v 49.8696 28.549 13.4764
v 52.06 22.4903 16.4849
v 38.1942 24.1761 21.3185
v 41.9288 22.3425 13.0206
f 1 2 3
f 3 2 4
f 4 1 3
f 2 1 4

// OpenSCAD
// Auto-generated auxetic polyhedron
points = [
    [38.194204, 24.176076, 21.318477],
    [52.059952, 22.490314, 16.484935],
    [49.869558, 28.549023, 13.476408],
    [41.928761, 22.342461, 13.020647],
];

faces = [
    [0, 1, 2],
    [3, 1, 0],
    [0, 2, 3],
    [3, 2, 1],
];

polyhedron(points = points, faces = faces);
